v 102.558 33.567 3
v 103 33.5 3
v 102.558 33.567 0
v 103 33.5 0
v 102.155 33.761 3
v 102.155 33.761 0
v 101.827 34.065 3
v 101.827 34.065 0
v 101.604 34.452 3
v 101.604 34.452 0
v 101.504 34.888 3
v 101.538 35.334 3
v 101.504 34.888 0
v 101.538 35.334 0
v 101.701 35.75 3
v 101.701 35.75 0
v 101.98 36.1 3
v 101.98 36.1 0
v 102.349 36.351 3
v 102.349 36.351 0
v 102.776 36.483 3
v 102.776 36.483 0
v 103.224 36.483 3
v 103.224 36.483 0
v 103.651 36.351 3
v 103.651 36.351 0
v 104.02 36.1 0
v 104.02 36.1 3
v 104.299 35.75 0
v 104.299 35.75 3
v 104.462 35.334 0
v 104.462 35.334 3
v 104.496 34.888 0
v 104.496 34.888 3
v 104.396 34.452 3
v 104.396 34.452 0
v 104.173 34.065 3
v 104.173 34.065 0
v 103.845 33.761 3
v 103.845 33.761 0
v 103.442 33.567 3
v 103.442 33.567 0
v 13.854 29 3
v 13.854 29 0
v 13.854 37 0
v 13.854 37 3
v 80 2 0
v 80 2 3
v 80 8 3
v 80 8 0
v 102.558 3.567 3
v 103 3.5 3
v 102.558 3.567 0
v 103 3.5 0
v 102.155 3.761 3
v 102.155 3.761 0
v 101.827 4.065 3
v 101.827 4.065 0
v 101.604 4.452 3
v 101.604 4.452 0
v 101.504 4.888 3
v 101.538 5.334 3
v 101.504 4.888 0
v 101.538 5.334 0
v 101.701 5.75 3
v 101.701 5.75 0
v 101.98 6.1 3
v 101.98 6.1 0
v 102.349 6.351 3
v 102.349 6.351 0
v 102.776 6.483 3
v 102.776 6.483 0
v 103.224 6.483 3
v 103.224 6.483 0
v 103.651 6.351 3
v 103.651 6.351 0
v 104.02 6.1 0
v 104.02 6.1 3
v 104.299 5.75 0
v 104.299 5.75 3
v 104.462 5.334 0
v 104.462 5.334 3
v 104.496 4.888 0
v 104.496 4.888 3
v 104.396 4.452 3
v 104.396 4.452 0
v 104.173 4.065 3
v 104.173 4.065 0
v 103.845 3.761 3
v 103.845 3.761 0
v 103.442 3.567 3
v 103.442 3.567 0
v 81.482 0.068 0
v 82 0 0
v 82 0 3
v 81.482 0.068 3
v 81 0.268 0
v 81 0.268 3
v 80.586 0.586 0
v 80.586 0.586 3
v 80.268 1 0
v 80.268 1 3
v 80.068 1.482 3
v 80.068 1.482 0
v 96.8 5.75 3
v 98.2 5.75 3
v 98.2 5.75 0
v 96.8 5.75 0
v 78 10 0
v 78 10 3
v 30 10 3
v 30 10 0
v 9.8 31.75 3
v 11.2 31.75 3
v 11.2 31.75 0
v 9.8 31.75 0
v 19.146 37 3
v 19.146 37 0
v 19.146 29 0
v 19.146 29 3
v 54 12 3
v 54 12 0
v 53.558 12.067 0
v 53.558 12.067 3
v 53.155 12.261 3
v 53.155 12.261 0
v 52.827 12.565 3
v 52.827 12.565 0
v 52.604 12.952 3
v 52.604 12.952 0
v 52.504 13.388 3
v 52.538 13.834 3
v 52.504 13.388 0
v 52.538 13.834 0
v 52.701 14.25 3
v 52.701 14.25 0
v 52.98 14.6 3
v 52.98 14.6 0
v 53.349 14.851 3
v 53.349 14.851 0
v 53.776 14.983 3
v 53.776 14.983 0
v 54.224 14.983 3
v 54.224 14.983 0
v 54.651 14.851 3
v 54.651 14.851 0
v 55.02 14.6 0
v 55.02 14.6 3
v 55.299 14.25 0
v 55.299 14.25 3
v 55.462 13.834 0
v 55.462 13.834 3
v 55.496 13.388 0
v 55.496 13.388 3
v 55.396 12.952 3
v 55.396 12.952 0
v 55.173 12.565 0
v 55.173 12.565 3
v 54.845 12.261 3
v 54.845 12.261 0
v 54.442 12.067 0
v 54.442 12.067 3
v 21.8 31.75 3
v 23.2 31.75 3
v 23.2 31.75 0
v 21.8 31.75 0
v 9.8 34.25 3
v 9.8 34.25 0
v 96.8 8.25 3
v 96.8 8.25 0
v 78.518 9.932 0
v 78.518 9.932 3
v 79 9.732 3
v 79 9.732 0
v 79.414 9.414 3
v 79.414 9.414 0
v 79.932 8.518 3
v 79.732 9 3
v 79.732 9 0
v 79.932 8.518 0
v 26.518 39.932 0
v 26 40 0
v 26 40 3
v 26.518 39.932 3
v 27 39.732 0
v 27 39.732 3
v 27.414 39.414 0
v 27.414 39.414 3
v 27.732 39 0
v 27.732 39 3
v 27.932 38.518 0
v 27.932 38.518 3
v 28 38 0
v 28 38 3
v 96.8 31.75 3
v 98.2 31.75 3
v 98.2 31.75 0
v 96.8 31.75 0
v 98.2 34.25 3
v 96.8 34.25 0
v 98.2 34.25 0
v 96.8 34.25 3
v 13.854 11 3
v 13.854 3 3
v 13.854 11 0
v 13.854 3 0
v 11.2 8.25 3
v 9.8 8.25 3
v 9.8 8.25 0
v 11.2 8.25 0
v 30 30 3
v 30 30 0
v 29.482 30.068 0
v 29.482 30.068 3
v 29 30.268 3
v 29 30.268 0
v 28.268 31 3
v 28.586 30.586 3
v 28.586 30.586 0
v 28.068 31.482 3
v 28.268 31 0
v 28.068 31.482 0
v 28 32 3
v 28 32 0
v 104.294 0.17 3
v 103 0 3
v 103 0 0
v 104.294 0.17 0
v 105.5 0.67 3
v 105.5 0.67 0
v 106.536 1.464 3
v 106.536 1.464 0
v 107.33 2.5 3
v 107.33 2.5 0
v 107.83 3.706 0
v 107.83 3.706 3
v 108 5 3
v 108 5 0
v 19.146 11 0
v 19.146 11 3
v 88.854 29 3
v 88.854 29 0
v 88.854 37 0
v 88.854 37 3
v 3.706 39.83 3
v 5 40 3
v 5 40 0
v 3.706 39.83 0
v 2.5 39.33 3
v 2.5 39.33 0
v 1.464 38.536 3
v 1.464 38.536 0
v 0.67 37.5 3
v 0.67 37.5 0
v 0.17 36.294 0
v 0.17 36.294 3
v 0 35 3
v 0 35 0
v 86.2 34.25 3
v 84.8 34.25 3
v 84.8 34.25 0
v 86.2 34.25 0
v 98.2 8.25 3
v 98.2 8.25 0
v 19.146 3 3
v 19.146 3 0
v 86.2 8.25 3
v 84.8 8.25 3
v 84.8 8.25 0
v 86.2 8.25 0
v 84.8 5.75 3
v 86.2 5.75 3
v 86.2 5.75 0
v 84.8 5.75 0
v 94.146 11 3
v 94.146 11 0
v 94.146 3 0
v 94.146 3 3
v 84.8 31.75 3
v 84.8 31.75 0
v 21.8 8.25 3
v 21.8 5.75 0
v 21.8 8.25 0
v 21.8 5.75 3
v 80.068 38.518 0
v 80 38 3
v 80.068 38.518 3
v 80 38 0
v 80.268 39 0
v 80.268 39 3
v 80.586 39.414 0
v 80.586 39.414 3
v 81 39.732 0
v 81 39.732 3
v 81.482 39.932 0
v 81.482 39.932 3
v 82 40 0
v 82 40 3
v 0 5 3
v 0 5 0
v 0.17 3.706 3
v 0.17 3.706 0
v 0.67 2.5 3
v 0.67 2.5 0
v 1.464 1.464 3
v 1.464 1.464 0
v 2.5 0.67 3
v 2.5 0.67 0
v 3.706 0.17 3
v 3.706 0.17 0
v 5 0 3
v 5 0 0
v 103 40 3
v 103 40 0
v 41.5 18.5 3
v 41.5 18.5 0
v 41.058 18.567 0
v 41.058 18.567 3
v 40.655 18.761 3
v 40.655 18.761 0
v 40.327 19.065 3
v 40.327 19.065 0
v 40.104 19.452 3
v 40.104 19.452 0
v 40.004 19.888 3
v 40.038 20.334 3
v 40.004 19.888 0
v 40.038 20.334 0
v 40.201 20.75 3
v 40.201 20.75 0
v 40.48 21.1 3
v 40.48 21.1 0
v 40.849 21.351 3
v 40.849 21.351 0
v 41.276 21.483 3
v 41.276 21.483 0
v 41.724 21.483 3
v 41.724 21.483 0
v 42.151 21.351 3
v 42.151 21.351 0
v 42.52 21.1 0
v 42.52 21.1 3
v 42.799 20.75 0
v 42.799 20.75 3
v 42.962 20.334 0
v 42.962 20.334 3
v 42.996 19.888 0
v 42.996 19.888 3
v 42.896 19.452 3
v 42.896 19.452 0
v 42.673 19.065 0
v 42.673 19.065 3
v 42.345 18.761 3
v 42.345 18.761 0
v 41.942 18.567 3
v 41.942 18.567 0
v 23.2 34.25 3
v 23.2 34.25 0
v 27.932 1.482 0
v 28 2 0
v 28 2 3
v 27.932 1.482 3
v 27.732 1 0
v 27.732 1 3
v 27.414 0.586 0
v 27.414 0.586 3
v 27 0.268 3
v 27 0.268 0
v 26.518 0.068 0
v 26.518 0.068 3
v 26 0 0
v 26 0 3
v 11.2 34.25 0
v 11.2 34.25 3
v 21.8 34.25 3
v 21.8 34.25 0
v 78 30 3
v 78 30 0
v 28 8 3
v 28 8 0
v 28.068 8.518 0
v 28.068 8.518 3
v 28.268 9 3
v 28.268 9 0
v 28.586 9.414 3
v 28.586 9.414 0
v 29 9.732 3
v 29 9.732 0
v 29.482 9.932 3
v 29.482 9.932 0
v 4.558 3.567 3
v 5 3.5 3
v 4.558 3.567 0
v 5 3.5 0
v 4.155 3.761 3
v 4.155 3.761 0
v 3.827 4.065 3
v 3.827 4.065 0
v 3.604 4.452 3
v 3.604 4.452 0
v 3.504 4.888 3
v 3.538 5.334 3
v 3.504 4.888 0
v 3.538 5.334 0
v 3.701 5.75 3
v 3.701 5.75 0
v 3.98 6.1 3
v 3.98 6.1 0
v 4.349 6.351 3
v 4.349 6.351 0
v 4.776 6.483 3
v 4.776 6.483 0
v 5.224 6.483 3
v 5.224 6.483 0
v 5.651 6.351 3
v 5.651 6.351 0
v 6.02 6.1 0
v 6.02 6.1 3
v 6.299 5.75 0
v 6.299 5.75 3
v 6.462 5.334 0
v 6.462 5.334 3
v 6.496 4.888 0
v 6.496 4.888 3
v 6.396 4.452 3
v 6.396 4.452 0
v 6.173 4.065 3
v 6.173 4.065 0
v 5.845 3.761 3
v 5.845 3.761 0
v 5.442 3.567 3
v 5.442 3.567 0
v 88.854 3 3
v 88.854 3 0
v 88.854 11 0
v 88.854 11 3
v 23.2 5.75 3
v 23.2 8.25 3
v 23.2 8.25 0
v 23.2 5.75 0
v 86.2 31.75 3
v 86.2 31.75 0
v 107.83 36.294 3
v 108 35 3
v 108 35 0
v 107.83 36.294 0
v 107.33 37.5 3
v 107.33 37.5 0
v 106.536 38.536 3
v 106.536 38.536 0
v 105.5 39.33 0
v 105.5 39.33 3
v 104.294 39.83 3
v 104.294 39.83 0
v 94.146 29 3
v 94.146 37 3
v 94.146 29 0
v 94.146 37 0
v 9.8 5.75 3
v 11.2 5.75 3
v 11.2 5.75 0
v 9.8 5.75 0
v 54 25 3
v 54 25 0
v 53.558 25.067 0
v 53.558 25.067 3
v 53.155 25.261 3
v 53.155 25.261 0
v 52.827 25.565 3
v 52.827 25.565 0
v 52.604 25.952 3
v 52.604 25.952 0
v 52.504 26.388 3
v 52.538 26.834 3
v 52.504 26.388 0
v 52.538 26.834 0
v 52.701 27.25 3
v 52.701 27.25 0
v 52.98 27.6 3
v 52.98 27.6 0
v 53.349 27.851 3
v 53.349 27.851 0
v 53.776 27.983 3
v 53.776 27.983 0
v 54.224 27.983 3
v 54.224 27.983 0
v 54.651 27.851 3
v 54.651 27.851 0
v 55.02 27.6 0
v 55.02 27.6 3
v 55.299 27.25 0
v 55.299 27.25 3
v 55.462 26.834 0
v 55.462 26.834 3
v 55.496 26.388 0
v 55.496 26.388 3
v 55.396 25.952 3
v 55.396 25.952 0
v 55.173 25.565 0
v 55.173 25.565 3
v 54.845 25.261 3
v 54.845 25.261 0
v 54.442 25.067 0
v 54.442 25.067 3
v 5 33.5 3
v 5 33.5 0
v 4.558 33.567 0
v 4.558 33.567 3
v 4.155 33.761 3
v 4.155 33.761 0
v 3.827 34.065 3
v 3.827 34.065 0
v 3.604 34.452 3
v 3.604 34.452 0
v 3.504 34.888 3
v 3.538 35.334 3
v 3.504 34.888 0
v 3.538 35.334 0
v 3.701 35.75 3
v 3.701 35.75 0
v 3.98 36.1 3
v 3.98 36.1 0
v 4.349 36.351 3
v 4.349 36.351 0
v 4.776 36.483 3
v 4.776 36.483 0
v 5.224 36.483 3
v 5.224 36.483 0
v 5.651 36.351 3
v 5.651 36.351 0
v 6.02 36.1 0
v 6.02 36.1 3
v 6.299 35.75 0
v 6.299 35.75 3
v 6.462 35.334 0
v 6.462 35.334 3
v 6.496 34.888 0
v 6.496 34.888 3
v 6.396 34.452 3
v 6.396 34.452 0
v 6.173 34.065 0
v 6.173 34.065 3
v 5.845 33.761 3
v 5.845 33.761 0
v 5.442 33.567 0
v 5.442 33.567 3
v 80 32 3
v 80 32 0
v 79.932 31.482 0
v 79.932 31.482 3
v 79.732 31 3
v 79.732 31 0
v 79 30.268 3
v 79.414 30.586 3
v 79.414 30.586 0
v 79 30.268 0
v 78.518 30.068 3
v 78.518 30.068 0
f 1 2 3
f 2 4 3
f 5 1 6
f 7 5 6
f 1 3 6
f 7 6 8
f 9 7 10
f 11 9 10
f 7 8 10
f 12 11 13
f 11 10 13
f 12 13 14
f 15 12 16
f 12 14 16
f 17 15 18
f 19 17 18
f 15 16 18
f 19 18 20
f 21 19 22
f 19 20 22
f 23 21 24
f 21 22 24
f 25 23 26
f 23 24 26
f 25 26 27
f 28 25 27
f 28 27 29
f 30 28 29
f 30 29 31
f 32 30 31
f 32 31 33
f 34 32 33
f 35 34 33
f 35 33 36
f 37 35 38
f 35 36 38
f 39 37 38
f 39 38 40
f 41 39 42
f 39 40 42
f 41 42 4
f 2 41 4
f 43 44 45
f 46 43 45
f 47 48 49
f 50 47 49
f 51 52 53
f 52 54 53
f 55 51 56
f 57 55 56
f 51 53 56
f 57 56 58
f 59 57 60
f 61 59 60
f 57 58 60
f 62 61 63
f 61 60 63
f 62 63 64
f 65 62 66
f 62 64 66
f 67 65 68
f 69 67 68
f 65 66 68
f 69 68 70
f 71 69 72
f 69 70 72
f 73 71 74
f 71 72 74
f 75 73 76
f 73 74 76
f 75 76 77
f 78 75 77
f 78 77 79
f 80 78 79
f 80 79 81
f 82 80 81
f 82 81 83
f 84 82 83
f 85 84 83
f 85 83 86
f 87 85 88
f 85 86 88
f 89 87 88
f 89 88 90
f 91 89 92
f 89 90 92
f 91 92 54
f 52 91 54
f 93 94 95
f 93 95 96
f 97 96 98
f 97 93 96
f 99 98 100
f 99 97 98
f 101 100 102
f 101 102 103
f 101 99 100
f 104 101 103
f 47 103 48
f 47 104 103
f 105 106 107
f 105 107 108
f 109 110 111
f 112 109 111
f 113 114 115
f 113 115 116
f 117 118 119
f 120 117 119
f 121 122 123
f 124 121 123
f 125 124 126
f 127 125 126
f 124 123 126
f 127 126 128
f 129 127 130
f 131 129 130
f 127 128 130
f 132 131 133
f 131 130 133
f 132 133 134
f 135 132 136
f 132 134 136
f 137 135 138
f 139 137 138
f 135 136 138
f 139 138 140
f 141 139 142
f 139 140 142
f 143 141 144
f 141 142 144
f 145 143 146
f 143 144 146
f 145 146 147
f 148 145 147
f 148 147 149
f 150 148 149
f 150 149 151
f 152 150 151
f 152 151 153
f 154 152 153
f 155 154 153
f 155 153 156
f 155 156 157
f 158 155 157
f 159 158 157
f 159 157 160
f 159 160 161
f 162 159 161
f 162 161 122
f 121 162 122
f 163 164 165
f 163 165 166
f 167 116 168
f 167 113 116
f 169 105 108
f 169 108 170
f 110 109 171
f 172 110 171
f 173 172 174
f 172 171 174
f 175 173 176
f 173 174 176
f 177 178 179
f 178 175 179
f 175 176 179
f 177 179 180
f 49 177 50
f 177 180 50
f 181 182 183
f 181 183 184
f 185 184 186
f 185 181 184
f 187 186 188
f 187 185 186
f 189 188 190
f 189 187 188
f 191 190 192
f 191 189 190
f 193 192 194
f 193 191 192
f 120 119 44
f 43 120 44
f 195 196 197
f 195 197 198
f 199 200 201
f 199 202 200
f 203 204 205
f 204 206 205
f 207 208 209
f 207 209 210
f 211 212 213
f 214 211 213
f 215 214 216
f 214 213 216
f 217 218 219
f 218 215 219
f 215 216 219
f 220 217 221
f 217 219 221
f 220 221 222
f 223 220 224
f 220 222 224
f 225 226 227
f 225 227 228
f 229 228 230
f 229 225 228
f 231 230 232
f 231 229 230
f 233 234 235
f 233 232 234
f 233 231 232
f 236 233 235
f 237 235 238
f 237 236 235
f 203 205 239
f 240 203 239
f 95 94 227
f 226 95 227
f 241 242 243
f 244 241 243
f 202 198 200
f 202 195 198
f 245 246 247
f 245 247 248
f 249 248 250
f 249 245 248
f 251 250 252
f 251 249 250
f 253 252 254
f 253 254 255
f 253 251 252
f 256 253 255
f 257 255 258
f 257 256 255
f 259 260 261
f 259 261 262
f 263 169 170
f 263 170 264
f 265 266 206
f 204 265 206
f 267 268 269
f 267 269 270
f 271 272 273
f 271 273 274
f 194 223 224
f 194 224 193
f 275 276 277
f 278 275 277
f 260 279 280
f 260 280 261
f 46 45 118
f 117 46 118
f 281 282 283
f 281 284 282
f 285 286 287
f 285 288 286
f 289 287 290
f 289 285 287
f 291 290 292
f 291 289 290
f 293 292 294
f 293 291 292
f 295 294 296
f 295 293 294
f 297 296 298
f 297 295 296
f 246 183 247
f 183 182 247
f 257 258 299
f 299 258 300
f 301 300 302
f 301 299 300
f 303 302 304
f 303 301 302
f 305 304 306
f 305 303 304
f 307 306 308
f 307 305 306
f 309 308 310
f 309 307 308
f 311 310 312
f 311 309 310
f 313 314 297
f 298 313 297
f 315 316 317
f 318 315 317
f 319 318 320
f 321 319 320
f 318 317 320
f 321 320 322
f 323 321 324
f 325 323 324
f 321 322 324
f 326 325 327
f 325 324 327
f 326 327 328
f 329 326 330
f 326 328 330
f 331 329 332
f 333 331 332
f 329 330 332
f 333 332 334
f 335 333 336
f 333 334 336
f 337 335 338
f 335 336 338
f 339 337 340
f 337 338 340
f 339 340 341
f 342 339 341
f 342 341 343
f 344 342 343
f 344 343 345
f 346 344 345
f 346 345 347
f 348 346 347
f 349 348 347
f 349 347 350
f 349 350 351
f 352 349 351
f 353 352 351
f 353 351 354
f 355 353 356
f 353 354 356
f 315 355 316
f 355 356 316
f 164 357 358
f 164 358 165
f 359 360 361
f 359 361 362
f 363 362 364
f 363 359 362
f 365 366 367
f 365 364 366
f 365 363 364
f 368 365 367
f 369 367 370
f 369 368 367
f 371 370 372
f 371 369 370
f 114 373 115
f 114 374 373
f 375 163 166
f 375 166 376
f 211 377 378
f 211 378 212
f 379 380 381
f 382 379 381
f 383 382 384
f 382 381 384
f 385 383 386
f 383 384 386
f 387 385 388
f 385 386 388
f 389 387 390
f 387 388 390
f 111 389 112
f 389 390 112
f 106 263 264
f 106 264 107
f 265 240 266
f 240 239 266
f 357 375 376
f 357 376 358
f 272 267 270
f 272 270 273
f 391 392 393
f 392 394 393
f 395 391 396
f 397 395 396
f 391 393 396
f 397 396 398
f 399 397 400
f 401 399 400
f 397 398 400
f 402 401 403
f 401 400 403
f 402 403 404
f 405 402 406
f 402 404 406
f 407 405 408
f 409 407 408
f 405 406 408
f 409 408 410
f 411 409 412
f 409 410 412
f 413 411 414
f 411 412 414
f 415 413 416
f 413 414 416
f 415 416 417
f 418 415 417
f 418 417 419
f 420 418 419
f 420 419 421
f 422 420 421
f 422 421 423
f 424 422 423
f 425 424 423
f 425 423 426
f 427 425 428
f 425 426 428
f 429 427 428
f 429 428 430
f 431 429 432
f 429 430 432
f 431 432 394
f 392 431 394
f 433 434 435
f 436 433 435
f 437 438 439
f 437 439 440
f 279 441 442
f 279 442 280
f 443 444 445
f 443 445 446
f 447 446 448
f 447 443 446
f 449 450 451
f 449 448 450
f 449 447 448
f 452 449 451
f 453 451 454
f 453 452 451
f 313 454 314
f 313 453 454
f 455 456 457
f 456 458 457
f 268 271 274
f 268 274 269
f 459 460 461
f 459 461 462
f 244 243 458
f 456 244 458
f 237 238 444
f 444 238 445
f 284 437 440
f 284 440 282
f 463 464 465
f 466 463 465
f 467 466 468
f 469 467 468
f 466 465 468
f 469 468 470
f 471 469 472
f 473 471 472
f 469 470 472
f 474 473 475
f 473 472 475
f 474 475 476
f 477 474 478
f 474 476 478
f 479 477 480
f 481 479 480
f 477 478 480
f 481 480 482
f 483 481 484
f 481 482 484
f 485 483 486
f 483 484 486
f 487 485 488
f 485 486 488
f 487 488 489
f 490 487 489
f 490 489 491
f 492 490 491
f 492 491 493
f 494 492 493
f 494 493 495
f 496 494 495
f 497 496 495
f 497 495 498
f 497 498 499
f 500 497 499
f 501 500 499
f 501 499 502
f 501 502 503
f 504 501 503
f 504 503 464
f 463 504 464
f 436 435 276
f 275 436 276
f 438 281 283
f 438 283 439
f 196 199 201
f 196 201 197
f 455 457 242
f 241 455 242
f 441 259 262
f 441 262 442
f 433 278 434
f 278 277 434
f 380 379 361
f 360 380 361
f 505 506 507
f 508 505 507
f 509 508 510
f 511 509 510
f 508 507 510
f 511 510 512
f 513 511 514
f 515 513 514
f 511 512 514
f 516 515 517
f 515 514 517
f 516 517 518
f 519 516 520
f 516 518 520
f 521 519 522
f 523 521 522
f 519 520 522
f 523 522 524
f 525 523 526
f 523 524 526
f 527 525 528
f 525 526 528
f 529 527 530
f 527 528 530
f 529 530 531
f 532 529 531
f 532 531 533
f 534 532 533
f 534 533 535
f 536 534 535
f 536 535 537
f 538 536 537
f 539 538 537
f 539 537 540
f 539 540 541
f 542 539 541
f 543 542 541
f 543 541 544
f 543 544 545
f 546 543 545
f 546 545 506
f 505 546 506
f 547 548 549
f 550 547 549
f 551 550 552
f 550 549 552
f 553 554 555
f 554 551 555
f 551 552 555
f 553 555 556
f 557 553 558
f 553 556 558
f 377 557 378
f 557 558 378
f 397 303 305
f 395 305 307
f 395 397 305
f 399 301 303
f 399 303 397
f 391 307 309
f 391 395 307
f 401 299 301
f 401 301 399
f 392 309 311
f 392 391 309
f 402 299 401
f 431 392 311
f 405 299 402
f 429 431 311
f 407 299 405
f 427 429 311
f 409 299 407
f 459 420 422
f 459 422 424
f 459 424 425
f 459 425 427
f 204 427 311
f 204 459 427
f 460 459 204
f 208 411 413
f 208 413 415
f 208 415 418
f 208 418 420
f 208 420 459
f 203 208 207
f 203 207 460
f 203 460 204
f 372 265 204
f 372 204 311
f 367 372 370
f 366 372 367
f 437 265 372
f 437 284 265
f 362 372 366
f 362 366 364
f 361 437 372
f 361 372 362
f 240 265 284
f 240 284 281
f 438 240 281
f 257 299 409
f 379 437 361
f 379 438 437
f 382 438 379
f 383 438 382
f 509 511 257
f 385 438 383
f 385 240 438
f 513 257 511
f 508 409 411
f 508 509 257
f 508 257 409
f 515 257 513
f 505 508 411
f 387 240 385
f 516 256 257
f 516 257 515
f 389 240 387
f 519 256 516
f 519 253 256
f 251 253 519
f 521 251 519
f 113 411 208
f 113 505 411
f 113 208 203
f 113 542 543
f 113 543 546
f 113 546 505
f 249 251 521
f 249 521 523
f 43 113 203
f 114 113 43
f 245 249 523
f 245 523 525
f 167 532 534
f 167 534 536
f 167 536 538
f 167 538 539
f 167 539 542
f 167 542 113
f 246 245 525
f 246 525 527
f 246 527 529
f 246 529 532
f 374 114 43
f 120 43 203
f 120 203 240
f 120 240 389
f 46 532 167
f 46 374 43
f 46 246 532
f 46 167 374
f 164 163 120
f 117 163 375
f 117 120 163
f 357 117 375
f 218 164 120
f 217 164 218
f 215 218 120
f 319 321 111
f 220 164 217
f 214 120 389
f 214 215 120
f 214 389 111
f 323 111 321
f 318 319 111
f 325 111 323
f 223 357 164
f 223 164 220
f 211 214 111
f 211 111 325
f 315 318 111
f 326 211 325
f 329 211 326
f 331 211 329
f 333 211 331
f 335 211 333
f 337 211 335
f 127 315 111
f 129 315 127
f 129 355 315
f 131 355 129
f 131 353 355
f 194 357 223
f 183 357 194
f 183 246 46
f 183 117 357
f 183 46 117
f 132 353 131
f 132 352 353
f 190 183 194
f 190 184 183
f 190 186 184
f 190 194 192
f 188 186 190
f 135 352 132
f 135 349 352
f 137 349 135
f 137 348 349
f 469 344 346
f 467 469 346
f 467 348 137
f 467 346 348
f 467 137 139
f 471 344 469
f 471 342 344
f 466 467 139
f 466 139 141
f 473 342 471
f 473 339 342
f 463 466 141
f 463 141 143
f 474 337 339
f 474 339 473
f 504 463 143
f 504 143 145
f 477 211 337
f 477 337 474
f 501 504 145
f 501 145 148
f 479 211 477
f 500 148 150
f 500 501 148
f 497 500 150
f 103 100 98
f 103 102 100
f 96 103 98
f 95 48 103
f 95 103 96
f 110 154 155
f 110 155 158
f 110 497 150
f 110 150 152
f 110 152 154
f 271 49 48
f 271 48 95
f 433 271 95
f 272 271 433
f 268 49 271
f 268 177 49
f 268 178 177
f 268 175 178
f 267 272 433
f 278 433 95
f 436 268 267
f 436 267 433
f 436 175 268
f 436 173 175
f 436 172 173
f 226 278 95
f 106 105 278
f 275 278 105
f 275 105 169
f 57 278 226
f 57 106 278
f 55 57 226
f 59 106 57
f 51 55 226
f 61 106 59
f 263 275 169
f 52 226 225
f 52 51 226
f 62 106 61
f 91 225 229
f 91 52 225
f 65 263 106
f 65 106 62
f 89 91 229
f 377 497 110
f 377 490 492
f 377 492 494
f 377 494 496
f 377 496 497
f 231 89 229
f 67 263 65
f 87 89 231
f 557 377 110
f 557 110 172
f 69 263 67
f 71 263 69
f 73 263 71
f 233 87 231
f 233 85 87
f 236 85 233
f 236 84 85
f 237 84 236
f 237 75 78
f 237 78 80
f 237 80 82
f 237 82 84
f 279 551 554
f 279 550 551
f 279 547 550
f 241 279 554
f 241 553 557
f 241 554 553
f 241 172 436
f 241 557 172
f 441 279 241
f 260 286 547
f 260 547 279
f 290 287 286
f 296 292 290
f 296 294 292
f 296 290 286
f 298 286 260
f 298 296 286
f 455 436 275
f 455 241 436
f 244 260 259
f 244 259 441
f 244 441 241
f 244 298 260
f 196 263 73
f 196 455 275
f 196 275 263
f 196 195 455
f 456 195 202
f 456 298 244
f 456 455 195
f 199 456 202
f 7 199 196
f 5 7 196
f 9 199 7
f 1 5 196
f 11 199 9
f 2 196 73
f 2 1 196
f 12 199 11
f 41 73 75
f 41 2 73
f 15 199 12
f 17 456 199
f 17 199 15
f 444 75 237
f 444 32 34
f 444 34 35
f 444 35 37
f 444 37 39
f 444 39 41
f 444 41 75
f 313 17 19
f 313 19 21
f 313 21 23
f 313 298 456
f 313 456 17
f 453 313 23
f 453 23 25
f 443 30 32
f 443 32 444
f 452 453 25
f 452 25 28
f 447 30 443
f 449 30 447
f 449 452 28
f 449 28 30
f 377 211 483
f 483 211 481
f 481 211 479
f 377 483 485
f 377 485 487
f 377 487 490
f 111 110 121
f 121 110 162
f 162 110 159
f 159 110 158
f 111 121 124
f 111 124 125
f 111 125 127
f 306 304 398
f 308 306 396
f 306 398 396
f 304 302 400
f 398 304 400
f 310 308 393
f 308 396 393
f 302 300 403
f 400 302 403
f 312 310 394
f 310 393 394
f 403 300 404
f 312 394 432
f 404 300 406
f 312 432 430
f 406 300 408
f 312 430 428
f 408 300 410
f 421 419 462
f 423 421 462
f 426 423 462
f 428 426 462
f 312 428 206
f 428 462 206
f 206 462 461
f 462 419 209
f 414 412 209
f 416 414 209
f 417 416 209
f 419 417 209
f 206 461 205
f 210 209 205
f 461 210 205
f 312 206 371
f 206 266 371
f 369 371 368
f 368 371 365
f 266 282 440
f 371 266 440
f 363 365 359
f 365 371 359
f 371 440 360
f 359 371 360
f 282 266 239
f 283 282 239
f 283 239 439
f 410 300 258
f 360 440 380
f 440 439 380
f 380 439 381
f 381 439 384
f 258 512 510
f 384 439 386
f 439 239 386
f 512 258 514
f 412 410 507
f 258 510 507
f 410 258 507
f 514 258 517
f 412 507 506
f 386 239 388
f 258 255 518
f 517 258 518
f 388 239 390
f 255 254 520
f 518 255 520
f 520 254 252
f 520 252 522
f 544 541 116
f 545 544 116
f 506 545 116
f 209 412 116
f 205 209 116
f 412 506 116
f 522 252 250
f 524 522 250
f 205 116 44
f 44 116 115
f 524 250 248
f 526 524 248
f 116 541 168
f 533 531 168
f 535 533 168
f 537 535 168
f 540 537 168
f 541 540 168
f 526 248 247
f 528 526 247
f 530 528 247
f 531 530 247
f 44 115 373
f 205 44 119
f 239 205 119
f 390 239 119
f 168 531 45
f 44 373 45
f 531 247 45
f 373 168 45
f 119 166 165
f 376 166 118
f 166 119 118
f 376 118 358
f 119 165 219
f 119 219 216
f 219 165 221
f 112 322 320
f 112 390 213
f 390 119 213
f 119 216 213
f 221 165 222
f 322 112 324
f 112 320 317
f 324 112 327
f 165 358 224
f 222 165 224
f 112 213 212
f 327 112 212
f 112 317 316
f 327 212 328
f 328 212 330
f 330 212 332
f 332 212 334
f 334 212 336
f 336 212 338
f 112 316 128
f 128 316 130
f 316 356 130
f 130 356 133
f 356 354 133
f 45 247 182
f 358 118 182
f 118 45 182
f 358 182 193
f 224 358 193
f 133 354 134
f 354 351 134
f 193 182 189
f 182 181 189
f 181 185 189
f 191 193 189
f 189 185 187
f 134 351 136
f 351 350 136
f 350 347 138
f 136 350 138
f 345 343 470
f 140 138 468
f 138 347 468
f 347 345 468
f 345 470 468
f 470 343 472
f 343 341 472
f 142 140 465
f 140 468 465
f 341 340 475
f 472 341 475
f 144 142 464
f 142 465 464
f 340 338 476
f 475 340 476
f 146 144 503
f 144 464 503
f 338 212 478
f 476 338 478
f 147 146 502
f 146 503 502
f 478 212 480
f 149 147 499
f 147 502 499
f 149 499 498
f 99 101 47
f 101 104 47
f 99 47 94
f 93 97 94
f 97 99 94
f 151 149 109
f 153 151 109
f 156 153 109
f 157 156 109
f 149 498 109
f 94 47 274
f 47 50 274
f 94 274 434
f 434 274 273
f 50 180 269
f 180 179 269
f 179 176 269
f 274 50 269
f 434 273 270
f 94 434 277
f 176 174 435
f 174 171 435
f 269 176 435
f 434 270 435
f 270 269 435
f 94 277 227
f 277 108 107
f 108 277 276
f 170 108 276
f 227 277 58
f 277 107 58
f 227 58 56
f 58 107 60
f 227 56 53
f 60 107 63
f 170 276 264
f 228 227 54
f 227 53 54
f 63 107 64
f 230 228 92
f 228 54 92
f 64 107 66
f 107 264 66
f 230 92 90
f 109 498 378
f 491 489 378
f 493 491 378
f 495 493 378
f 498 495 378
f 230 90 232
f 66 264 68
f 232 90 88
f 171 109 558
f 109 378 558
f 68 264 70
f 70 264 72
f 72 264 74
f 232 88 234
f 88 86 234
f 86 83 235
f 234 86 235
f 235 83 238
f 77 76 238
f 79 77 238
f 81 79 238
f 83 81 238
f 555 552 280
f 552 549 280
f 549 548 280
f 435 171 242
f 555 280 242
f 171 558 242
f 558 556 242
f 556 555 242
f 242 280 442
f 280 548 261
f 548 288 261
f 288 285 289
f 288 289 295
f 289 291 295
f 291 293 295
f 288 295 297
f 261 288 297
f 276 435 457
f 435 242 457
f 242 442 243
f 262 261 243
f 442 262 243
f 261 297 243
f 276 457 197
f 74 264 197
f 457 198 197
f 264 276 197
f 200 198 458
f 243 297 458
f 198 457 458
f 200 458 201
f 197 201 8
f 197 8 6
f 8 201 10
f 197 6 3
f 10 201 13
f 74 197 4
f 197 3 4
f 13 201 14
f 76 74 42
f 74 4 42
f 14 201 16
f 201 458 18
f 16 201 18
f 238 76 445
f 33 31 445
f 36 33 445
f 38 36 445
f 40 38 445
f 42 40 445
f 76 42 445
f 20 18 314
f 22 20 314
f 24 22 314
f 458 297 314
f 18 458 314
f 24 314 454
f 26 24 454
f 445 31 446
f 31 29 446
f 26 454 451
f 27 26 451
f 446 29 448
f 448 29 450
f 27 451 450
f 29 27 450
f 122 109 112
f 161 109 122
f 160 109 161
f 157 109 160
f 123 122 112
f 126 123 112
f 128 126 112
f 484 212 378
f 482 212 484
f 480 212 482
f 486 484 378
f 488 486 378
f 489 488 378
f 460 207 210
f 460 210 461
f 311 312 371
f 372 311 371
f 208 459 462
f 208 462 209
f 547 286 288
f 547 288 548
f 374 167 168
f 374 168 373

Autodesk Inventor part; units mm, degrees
ref_plane "YZ Plane" through (0, 0, 0) normal (1, 0, 0) x (0, 1, 0)
ref_plane "XZ Plane" through (0, 0, 0) normal (0, 1, 0) x (-1, 0, 0)
ref_plane "XY Plane" through (0, 0, 0) normal (0, 0, 1) x (1, 0, 0)
sketch "Sketch1" plane through (0, 0, 0) normal (0, 0, 1) x (1, 0, 0)
  line L0 (0, 0) -> (108, 0)
  line L1 (108, 0) -> (108, 40)
  line L2 (108, 40) -> (0, 40)
  line L3 (0, 40) -> (0, 0)
  line L4 (13.854, 37) -> (19.146, 37)
  line L5 (19.146, 37) -> (19.146, 29)
  line L6 (19.146, 29) -> (13.854, 29)
  line L7 (13.854, 29) -> (13.854, 37)
  line L8 (13.854, 11) -> (19.146, 11)
  line L9 (19.146, 11) -> (19.146, 3)
  line L10 (19.146, 3) -> (13.854, 3)
  line L11 (13.854, 3) -> (13.854, 11)
  line L12 (88.854, 37) -> (94.146, 37)
  line L13 (94.146, 37) -> (94.146, 29)
  line L14 (94.146, 29) -> (88.854, 29)
  line L15 (88.854, 29) -> (88.854, 37)
  line L16 (88.854, 11) -> (94.146, 11)
  line L17 (94.146, 11) -> (94.146, 3)
  line L18 (94.146, 3) -> (88.854, 3)
  line L19 (88.854, 3) -> (88.854, 11)
  dimension "d0" = 40
  dimension "d1" = 108
  dimension "d73" = 8
  dimension "d74" = 5.292
  dimension "d75" = 3
  dimension "d76" = 13.854
  dimension "d77" = 5.292
  dimension "d78" = 8
  dimension "d79" = 3
  dimension "d80" = 5.292
  dimension "d81" = 8
  dimension "d82" = 13.854
  dimension "d83" = 3
  dimension "d84" = 5.292
  dimension "d85" = 13.854
extrude "Extrusion1" add sketch "Sketch1" along normal blind 3
sketch "Sketch3" plane through (0, 0, 3) normal (0, 0, 1) x (1, 0, 0)
  line L0 (0, 0) -> (0, 40) projected
  line L1 (108, 0) -> (0, 0) projected
  line L2 (0, 40) -> (108, 40) projected
  point P0 (54, 26.5)
  point P1 (54, 13.5)
  dimension "d56" = 54
  dimension "d57" = 13.5
  dimension "d58" = 13.5
  dimension "d59" = 54
hole "Hole1" at (54, 26.5, 3) at (54, 13.5, 3) direction (0, 0, -1) diameter 3 end through all
sketch "Sketch8" plane through (0, 0, 3) normal (0, 0, 1) x (1, 0, 0)
  line L0 (108, 0) -> (0, 0) projected
  line L1 (0, 40) -> (108, 40) projected
  line L2 (28, 40) -> (80, 40)
  line L3 (80, 40) -> (80, 30)
  line L4 (80, 30) -> (28, 30)
  line L5 (28, 30) -> (28, 40)
  line L6 (28, 0) -> (80, 0)
  line L7 (80, 0) -> (80, 10)
  line L8 (80, 10) -> (28, 10)
  line L9 (28, 10) -> (28, 0)
  line L10 (108, 40) -> (108, 0) projected
  line L11 (0, 0) -> (0, 40) projected
  dimension "d68" = 10
  dimension "d69" = 10
  dimension "d87" = 28
  dimension "d88" = 28
  dimension "d130" = 28
  dimension "d131" = 28
extrude "Extrusion5" cut sketch "Sketch8" against normal through all contours L0 L9 L8 L7 | L3 L4 L5 L1
fillet "Fillet3" radius 2 8 edges at (28, 40, 1.5) (28, 0, 1.5) (28, 10, 1.5) (28, 30, 1.5) (80, 10, 1.5) (80, 30, 1.5) (80, 0, 1.5) (80, 40, 1.5)
fillet "Fillet4" radius 5 4 edges at (0, 0, 1.5) (0, 40, 1.5) (108, 0, 1.5) (108, 40, 1.5)
sketch "Sketch12" plane through (0, 0, 3) normal (0, 0, 1) x (1, 0, 0)
  arc A0 (5, 40) -> (0, 35) centre (5, 35) ccw projected
  arc A1 (0, 5) -> (5, 0) centre (5, 5) ccw projected
  arc A2 (103, 0) -> (108, 5) centre (103, 5) ccw projected
  arc A3 (108, 35) -> (103, 40) centre (103, 35) ccw projected
  circle A4 centre (54, 26.5) radius 1.5 projected
  line L0 (78, 30) -> (30, 30) projected
  point P0 (41.5, 20)
  dimension "d141" = 12.5
  dimension "d142" = 10
hole "Hole4" at (5, 35, 3) at (5, 5, 3) at (103, 35, 3) at (103, 5, 3) at (41.5, 20, 3) direction (0, 0, -1) diameter 3 end through all
sketch "草圖14" plane through (0, 0, 3) normal (0, 0, 1) x (1, 0, 0)
  line L0 (94.146, 37) -> (94.146, 29) projected
  line L1 (88.854, 29) -> (88.854, 37) projected
  line L2 (19.146, 37) -> (19.146, 29) projected
  line L3 (13.854, 29) -> (13.854, 37) projected
  line L4 (13.854, 37) -> (19.146, 37) projected
  line L5 (13.854, 11) -> (19.146, 11) projected
  line L6 (9.8, 34.25) -> (11.2, 34.25)
  line L7 (11.2, 34.25) -> (11.2, 31.75)
  line L8 (11.2, 31.75) -> (9.8, 31.75)
  line L9 (9.8, 31.75) -> (9.8, 34.25)
  line L10 (21.8, 34.25) -> (23.2, 34.25)
  line L11 (23.2, 34.25) -> (23.2, 31.75)
  line L12 (23.2, 31.75) -> (21.8, 31.75)
  line L13 (21.8, 31.75) -> (21.8, 34.25)
  line L14 (9.8, 8.25) -> (11.2, 8.25)
  line L15 (11.2, 8.25) -> (11.2, 5.75)
  line L16 (11.2, 5.75) -> (9.8, 5.75)
  line L17 (9.8, 5.75) -> (9.8, 8.25)
  line L18 (21.8, 8.25) -> (23.2, 8.25)
  line L19 (23.2, 8.25) -> (23.2, 5.75)
  line L20 (23.2, 5.75) -> (21.8, 5.75)
  line L21 (21.8, 5.75) -> (21.8, 8.25)
  line L22 (84.8, 34.25) -> (86.2, 34.25)
  line L23 (86.2, 34.25) -> (86.2, 31.75)
  line L24 (86.2, 31.75) -> (84.8, 31.75)
  line L25 (84.8, 31.75) -> (84.8, 34.25)
  line L26 (96.8, 34.25) -> (98.2, 34.25)
  line L27 (98.2, 34.25) -> (98.2, 31.75)
  line L28 (98.2, 31.75) -> (96.8, 31.75)
  line L29 (96.8, 31.75) -> (96.8, 34.25)
  line L30 (84.8, 8.25) -> (86.2, 8.25)
  line L31 (86.2, 8.25) -> (86.2, 5.75)
  line L32 (86.2, 5.75) -> (84.8, 5.75)
  line L33 (84.8, 5.75) -> (84.8, 8.25)
  line L34 (96.8, 8.25) -> (98.2, 8.25)
  line L35 (98.2, 8.25) -> (98.2, 5.75)
  line L36 (98.2, 5.75) -> (96.8, 5.75)
  line L37 (96.8, 5.75) -> (96.8, 8.25)
  point P0 (0, 0)
  dimension "d143" = 1.4
  dimension "d145" = 2.654
  dimension "d146" = 2.75
  dimension "d147" = 2.5
  dimension "d148" = 1.4
  dimension "d149" = 2.654
  dimension "d150" = 2.5
  dimension "d151" = 1.4
  dimension "d152" = 2.75
  dimension "d153" = 1.4
  dimension "d154" = 2.5
  dimension "d155" = 2.654
  dimension "d156" = 2.654
  dimension "d157" = 1.4
  dimension "d158" = 1.4
  dimension "d159" = 1.4
extrude "擠出7" cut sketch "草圖14" against normal through all
properties part number "plastic_part_12"
